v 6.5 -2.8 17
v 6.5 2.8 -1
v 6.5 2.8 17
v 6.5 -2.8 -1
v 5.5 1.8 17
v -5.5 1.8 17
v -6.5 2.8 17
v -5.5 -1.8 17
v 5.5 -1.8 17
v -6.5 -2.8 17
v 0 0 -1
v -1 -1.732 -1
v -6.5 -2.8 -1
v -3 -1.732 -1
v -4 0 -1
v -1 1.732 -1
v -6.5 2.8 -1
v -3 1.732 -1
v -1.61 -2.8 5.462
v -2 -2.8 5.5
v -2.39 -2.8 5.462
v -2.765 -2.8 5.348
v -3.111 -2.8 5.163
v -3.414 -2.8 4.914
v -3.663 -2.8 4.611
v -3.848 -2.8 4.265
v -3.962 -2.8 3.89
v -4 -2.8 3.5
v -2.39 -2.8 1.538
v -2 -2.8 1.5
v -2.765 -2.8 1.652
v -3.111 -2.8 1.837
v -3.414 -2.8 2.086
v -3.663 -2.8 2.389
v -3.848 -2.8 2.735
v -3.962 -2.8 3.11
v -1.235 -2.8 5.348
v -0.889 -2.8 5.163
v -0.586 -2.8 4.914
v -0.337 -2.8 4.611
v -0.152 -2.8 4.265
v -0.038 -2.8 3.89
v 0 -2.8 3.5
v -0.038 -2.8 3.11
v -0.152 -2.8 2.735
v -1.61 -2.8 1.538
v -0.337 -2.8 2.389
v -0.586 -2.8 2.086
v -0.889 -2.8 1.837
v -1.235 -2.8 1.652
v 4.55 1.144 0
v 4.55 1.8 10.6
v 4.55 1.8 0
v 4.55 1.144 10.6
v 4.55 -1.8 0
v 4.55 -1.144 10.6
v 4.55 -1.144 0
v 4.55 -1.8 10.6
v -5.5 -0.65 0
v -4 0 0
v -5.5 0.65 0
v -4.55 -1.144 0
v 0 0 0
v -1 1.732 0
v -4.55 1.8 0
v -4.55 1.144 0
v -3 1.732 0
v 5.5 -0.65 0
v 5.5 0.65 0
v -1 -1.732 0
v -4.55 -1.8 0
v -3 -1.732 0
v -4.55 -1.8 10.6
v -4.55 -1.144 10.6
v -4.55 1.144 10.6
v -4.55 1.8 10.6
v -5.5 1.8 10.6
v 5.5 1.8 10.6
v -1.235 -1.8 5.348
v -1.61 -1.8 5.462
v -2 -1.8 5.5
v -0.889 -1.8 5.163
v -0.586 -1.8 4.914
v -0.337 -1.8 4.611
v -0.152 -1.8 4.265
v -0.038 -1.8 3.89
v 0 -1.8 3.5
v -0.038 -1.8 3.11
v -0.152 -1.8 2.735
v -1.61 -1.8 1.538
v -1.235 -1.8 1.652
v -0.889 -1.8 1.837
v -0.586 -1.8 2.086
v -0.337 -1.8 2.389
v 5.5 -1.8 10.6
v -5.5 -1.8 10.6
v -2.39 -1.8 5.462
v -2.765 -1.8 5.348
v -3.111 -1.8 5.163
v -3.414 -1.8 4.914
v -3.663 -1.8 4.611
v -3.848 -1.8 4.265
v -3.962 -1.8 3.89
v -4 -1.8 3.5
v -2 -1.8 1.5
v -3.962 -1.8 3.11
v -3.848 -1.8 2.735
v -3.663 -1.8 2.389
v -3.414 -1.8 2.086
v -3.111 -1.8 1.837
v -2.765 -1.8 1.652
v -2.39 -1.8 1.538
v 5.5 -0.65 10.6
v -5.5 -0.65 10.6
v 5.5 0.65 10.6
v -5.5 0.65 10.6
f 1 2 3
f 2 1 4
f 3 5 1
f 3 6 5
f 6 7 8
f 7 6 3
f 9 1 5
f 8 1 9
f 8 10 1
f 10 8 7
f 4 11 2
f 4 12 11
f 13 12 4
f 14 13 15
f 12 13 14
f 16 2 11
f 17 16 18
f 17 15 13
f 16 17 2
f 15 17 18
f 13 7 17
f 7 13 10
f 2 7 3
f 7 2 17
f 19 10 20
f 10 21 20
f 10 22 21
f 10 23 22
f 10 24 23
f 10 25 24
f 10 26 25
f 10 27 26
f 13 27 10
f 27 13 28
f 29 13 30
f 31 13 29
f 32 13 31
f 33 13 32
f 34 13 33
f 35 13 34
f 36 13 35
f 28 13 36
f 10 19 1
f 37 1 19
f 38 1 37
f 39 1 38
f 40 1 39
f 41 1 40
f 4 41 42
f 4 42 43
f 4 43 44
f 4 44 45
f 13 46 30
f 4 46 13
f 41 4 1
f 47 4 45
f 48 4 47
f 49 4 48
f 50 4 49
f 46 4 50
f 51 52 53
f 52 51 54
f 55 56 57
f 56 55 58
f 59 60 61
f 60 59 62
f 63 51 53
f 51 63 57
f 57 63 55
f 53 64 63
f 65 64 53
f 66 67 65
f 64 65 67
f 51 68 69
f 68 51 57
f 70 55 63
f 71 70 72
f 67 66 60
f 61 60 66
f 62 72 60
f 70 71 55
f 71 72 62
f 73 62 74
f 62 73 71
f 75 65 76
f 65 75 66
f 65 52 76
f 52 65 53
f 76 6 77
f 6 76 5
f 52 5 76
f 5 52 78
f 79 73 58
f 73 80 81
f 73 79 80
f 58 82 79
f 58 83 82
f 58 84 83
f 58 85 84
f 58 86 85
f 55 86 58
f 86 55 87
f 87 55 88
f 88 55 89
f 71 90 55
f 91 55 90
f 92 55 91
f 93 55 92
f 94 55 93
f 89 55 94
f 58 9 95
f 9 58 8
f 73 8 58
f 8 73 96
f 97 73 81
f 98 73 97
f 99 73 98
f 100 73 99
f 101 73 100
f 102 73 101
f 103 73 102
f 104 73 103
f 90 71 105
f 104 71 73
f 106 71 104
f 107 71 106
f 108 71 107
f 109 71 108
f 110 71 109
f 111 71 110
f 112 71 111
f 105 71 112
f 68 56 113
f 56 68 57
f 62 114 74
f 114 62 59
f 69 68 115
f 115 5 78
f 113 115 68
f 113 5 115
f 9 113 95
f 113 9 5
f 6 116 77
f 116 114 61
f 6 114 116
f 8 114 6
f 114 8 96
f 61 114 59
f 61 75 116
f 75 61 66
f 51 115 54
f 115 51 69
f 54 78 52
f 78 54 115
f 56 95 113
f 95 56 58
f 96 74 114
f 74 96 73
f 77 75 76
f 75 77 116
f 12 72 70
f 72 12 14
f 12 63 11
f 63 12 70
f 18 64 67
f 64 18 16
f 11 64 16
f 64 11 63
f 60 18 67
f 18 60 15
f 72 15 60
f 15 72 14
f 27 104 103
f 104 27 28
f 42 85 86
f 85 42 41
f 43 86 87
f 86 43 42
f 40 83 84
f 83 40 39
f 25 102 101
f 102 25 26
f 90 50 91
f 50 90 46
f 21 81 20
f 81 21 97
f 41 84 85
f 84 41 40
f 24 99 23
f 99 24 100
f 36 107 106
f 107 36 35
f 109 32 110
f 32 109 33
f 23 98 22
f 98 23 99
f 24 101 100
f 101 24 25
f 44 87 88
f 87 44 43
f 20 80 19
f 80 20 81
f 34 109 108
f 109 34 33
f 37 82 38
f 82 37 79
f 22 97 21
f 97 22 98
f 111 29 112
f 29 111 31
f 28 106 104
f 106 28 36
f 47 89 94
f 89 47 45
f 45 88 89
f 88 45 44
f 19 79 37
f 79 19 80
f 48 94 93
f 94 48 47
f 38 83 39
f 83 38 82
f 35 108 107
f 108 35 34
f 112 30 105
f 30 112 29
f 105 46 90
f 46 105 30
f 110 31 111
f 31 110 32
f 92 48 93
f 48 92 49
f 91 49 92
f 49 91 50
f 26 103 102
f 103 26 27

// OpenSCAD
$x = 10.5;
$y = 1.6;
$z = 13.6;

%translate([0,0,$z/2]) cube([$x,$y,$z],center=true);

difference() {
    translate([0,0,9-1]) cube([$x+2.5,$y+4,18],center=true);
    //translate([0,0,10]) cube([$x+1,$y+0.4,20],center=true);
    translate([0,0,10]) cube([$x-1.4,$y+2,20],center=true);
    hull() {
        translate([0,0,10]) cube([$x+0.5,$y-0.3,20],center=true);
        translate([0,0,10]) cube([$x-2,$y+1,20],center=true);
    }


    translate([0,0,10+$z-3]) cube([$x+0.5,$y+2,20],center=true);
    translate([-2.0,0,-5]) cylinder(r=2,h=10,$fn=6);
    translate([-2.0,0,3.5]) rotate([90,0,0]) cylinder(r=2,h=10,$fn=32);
}
